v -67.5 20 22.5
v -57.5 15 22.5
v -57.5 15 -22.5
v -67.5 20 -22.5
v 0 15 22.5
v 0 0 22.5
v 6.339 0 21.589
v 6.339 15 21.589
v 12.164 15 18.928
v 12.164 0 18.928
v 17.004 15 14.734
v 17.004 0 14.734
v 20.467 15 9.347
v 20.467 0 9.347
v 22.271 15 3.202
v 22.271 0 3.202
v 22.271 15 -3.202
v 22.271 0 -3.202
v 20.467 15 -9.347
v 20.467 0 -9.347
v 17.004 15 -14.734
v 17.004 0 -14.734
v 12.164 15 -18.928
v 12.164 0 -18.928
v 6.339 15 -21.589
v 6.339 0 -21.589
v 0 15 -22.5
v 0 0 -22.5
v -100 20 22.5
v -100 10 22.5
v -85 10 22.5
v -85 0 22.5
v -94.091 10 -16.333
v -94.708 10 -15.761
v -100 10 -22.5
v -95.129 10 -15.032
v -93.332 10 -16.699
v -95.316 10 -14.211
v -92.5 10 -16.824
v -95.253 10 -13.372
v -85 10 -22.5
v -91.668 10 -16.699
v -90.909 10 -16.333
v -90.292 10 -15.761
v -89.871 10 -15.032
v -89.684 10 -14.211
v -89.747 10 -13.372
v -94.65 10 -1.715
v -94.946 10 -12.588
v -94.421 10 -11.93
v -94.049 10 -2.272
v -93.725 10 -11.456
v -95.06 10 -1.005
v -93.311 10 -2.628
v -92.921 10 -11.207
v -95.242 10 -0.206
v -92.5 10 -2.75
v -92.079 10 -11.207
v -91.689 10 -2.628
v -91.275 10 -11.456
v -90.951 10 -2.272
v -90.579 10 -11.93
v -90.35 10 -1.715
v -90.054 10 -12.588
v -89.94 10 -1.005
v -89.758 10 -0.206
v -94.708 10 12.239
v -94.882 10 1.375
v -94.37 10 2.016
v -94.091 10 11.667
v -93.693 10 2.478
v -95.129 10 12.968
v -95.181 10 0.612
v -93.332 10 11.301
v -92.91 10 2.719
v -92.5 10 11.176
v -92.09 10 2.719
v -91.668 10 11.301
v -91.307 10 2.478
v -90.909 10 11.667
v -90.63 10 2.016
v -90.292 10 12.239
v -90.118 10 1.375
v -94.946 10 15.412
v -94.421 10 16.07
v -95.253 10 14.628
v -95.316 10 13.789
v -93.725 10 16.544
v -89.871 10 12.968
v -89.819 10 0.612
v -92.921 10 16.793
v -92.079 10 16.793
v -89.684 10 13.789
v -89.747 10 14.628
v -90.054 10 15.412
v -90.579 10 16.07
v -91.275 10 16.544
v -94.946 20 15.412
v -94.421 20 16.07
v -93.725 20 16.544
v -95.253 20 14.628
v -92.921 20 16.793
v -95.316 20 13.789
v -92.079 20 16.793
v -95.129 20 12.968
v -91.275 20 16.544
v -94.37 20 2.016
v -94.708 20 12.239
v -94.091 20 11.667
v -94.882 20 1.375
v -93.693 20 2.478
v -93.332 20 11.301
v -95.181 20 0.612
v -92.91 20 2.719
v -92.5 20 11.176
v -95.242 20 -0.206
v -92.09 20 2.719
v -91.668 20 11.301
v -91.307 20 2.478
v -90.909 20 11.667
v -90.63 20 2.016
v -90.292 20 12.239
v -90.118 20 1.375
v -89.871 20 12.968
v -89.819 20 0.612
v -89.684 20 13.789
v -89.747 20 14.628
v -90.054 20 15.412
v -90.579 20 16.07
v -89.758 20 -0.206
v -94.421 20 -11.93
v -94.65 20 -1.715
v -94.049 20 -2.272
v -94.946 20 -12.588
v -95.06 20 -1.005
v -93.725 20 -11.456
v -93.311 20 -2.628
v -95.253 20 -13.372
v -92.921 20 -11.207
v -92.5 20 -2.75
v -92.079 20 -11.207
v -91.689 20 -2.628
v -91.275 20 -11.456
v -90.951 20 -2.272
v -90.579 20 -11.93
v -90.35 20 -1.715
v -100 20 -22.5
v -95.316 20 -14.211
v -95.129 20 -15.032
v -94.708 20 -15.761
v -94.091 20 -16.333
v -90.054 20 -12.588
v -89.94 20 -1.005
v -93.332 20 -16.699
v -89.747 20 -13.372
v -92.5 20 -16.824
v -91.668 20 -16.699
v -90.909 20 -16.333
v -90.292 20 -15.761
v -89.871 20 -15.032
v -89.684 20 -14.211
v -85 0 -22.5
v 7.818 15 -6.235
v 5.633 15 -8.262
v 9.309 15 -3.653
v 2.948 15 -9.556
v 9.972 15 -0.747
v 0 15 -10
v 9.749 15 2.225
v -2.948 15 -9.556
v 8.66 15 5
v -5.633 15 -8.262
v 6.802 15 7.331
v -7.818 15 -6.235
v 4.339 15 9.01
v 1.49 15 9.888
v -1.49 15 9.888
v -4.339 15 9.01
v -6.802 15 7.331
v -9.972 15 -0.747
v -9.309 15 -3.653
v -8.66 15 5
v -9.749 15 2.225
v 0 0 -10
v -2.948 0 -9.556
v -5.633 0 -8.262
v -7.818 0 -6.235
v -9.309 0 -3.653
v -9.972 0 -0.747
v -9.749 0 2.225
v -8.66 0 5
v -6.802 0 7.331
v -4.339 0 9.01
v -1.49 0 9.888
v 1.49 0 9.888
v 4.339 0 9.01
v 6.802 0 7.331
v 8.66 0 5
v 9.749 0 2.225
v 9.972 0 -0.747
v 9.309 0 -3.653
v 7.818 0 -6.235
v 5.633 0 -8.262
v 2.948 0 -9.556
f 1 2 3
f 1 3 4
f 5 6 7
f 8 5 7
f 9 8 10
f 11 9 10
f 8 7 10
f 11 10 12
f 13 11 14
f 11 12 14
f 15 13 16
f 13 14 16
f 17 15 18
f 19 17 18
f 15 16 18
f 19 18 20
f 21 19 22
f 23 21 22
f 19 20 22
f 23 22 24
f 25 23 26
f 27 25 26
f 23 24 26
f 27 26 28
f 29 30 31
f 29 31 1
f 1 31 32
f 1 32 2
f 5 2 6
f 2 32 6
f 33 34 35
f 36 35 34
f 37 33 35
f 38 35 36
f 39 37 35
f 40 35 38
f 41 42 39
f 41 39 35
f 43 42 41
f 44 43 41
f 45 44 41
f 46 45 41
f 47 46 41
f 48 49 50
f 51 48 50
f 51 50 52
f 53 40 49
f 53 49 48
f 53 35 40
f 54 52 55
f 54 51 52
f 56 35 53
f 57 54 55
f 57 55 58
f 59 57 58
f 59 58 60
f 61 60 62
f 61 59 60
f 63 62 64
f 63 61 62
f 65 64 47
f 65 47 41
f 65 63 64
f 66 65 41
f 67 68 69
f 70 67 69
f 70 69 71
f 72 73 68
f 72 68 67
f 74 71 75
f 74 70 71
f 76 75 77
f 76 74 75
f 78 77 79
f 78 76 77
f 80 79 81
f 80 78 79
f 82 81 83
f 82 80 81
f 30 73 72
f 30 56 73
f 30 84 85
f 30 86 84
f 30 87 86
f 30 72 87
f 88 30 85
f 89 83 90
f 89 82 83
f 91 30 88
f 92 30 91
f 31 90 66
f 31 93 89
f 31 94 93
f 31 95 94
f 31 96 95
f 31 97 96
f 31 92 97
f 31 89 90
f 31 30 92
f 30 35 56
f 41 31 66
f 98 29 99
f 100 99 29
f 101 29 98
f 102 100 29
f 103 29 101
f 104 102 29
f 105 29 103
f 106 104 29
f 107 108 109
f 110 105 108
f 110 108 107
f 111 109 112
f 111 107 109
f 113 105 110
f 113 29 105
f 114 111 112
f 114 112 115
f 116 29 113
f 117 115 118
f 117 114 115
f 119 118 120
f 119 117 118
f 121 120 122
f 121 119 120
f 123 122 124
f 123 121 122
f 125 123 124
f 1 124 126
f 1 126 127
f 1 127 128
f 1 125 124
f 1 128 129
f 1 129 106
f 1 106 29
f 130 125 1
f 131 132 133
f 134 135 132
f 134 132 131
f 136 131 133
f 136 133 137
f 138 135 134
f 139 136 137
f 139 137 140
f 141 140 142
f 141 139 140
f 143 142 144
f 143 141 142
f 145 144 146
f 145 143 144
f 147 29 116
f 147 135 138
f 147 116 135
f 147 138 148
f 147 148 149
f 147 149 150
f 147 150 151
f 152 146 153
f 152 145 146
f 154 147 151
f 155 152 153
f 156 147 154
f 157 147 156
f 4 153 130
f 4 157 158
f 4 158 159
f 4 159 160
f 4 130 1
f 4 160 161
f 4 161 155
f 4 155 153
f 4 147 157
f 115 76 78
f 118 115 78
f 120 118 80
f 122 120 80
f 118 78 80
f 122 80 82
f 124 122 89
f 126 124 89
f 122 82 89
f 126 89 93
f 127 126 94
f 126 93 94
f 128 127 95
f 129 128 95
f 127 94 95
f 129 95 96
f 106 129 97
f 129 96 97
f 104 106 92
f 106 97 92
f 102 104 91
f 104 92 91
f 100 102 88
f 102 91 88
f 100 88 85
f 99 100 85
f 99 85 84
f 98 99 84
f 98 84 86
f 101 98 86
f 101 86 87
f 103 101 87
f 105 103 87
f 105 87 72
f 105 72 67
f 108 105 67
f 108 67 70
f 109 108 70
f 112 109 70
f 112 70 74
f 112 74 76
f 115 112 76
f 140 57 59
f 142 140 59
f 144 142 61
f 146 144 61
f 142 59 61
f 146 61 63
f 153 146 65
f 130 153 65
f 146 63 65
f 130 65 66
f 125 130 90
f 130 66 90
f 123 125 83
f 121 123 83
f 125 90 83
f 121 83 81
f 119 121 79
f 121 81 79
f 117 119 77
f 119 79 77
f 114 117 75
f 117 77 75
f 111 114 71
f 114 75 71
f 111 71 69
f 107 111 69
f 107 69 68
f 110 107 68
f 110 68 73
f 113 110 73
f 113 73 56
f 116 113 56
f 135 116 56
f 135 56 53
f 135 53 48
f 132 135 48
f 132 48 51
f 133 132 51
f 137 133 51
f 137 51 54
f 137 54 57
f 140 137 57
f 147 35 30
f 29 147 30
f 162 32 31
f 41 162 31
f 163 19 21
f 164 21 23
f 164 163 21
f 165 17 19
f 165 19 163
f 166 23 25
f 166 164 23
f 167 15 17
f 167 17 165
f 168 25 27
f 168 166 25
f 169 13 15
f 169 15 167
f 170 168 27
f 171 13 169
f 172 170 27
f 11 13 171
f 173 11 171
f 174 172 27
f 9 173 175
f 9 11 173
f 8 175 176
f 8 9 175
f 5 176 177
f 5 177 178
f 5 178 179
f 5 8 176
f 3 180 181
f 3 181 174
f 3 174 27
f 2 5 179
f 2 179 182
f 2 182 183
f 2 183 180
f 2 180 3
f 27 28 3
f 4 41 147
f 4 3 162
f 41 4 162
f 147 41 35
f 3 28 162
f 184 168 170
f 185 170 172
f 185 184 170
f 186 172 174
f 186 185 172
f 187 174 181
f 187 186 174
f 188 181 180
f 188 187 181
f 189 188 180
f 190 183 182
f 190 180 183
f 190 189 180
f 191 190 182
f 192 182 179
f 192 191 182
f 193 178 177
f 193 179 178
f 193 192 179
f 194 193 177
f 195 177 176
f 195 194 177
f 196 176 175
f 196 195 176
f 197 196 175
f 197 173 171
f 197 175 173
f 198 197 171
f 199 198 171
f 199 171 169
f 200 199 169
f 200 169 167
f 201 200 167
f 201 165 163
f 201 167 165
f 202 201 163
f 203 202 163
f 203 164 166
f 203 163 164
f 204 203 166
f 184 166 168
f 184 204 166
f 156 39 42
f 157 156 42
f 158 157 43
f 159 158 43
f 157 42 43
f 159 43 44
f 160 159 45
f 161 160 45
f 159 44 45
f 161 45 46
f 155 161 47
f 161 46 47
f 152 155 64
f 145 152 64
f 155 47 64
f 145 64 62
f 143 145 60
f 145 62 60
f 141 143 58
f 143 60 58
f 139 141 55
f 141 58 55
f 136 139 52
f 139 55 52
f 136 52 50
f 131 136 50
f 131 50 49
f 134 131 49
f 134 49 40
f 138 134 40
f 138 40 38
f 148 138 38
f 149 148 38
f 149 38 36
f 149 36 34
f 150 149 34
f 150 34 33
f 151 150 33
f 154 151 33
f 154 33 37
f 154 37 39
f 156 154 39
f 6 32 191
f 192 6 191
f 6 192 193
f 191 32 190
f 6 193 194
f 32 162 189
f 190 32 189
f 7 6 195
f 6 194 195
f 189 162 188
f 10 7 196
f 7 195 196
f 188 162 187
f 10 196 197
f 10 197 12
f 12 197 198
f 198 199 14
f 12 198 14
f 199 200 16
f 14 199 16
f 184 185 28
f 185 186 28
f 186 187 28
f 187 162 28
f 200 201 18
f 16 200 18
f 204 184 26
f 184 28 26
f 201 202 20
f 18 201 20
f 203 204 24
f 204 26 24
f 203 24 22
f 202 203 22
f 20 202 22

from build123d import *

# Parameters (mm, degrees)
EXTRUDE_1_DEPTH     = 20
CUT_EXTRUDE_1_REACH = 113.467
SKETCH_2_W          = 15
SKETCH_2_H          = 10
CUT_EXTRUDE_2_REACH = 104.987
SKETCH_3_R          = 2.75
SKETCH_3_R_2        = 2.824113924
CUT_EXTRUDE_3_REACH = 106.433
SKETCH_4_R          = 10
CUT_EXTRUDE_4_REACH = 113.467


with BuildPart() as part:
    # 草图1 → 凸台-拉伸1 (new body)
    with BuildSketch(Plane(origin=(0, 0, 0), x_dir=(1, 0, 0), z_dir=(0, 1, 0))):
        with BuildLine():
            Line((0, 22.5), (-100, 22.5))
            Line((-100, 22.5), (-100, -22.5))
            Line((-100, -22.5), (0, -22.5))
            ThreePointArc((0, -22.5), (22.5, 0), (0, 22.5))
        make_face()
    extrude(amount=EXTRUDE_1_DEPTH)

    # 草图2 → 切除-拉伸1 (cut, up to next)
    with BuildSketch(Plane.XY.offset(22.5), mode=Mode.PRIVATE) as cut_extrude_1_sk1:
        with Locations((-92.5, 5)):
            Rectangle(SKETCH_2_W, SKETCH_2_H)
    cut_extrude_1_tool1 = extrude(cut_extrude_1_sk1.sketch, amount=-CUT_EXTRUDE_1_REACH, mode=Mode.PRIVATE) & part.part
    add(cut_extrude_1_tool1.solids().sort_by_distance((-92.5, 5, 22.5))[0], mode=Mode.SUBTRACT)

    # 草图3 → 切除-拉伸2 (cut, up to next)
    with BuildSketch(Plane.XZ.offset(-10), mode=Mode.PRIVATE) as cut_extrude_2_sk1:
        with Locations(Location((-92.5, 0, 0), (0, 0, 270))):
            Circle(SKETCH_3_R)
    cut_extrude_2_tool1 = extrude(cut_extrude_2_sk1.sketch, amount=-CUT_EXTRUDE_2_REACH, mode=Mode.PRIVATE) & part.part
    # 草图3 → 切除-拉伸2 (cut, up to next)
    with BuildSketch(Plane.XZ.offset(-10), mode=Mode.PRIVATE) as cut_extrude_2_sk2:
        with Locations(Location((-92.5, 14, 0), (0, 0, 270))):
            Circle(SKETCH_3_R_2)
    cut_extrude_2_tool2 = extrude(cut_extrude_2_sk2.sketch, amount=-CUT_EXTRUDE_2_REACH, mode=Mode.PRIVATE) & part.part
    # 草图3 → 切除-拉伸2 (cut, up to next)
    with BuildSketch(Plane.XZ.offset(-10), mode=Mode.PRIVATE) as cut_extrude_2_sk3:
        with Locations(Location((-92.5, -14, 0), (0, 0, 270))):
            Circle(SKETCH_3_R_2)
    cut_extrude_2_tool3 = extrude(cut_extrude_2_sk3.sketch, amount=-CUT_EXTRUDE_2_REACH, mode=Mode.PRIVATE) & part.part
    add(cut_extrude_2_tool1.solids().sort_by_distance((-92.5, 10, 0))[0], mode=Mode.SUBTRACT)
    add(cut_extrude_2_tool2.solids().sort_by_distance((-92.5, 10, 14))[0], mode=Mode.SUBTRACT)
    add(cut_extrude_2_tool3.solids().sort_by_distance((-92.5, 10, -14))[0], mode=Mode.SUBTRACT)

    # 草图4 → 切除-拉伸3 (cut, up to next)
    with BuildSketch(Plane(origin=(0, 0, 0), x_dir=(1, 0, 0), z_dir=(0, 1, 0)), mode=Mode.PRIVATE) as cut_extrude_3_sk1:
        with Locations(Location((0, 0, 0), (0, 0, 90))):
            Circle(SKETCH_4_R)
    cut_extrude_3_tool1 = extrude(cut_extrude_3_sk1.sketch, amount=CUT_EXTRUDE_3_REACH, mode=Mode.PRIVATE) & part.part
    add(cut_extrude_3_tool1.solids().sort_by_distance((0, 0, 0))[0], mode=Mode.SUBTRACT)

    # 草图5 → 切除-拉伸4 (cut, up to next)
    with BuildSketch(Plane.XY.offset(22.5), mode=Mode.PRIVATE) as cut_extrude_4_sk1:
        Polygon((22.5, 20), (22.5, 15), (-57.5, 15), (-67.5, 20), align=None)
    cut_extrude_4_tool1 = extrude(cut_extrude_4_sk1.sketch, amount=-CUT_EXTRUDE_4_REACH, mode=Mode.PRIVATE) & part.part
    add(cut_extrude_4_tool1.solids().sort_by_distance((-20.04902, 17.54902, 22.5))[0], mode=Mode.SUBTRACT)


solid = part.part
